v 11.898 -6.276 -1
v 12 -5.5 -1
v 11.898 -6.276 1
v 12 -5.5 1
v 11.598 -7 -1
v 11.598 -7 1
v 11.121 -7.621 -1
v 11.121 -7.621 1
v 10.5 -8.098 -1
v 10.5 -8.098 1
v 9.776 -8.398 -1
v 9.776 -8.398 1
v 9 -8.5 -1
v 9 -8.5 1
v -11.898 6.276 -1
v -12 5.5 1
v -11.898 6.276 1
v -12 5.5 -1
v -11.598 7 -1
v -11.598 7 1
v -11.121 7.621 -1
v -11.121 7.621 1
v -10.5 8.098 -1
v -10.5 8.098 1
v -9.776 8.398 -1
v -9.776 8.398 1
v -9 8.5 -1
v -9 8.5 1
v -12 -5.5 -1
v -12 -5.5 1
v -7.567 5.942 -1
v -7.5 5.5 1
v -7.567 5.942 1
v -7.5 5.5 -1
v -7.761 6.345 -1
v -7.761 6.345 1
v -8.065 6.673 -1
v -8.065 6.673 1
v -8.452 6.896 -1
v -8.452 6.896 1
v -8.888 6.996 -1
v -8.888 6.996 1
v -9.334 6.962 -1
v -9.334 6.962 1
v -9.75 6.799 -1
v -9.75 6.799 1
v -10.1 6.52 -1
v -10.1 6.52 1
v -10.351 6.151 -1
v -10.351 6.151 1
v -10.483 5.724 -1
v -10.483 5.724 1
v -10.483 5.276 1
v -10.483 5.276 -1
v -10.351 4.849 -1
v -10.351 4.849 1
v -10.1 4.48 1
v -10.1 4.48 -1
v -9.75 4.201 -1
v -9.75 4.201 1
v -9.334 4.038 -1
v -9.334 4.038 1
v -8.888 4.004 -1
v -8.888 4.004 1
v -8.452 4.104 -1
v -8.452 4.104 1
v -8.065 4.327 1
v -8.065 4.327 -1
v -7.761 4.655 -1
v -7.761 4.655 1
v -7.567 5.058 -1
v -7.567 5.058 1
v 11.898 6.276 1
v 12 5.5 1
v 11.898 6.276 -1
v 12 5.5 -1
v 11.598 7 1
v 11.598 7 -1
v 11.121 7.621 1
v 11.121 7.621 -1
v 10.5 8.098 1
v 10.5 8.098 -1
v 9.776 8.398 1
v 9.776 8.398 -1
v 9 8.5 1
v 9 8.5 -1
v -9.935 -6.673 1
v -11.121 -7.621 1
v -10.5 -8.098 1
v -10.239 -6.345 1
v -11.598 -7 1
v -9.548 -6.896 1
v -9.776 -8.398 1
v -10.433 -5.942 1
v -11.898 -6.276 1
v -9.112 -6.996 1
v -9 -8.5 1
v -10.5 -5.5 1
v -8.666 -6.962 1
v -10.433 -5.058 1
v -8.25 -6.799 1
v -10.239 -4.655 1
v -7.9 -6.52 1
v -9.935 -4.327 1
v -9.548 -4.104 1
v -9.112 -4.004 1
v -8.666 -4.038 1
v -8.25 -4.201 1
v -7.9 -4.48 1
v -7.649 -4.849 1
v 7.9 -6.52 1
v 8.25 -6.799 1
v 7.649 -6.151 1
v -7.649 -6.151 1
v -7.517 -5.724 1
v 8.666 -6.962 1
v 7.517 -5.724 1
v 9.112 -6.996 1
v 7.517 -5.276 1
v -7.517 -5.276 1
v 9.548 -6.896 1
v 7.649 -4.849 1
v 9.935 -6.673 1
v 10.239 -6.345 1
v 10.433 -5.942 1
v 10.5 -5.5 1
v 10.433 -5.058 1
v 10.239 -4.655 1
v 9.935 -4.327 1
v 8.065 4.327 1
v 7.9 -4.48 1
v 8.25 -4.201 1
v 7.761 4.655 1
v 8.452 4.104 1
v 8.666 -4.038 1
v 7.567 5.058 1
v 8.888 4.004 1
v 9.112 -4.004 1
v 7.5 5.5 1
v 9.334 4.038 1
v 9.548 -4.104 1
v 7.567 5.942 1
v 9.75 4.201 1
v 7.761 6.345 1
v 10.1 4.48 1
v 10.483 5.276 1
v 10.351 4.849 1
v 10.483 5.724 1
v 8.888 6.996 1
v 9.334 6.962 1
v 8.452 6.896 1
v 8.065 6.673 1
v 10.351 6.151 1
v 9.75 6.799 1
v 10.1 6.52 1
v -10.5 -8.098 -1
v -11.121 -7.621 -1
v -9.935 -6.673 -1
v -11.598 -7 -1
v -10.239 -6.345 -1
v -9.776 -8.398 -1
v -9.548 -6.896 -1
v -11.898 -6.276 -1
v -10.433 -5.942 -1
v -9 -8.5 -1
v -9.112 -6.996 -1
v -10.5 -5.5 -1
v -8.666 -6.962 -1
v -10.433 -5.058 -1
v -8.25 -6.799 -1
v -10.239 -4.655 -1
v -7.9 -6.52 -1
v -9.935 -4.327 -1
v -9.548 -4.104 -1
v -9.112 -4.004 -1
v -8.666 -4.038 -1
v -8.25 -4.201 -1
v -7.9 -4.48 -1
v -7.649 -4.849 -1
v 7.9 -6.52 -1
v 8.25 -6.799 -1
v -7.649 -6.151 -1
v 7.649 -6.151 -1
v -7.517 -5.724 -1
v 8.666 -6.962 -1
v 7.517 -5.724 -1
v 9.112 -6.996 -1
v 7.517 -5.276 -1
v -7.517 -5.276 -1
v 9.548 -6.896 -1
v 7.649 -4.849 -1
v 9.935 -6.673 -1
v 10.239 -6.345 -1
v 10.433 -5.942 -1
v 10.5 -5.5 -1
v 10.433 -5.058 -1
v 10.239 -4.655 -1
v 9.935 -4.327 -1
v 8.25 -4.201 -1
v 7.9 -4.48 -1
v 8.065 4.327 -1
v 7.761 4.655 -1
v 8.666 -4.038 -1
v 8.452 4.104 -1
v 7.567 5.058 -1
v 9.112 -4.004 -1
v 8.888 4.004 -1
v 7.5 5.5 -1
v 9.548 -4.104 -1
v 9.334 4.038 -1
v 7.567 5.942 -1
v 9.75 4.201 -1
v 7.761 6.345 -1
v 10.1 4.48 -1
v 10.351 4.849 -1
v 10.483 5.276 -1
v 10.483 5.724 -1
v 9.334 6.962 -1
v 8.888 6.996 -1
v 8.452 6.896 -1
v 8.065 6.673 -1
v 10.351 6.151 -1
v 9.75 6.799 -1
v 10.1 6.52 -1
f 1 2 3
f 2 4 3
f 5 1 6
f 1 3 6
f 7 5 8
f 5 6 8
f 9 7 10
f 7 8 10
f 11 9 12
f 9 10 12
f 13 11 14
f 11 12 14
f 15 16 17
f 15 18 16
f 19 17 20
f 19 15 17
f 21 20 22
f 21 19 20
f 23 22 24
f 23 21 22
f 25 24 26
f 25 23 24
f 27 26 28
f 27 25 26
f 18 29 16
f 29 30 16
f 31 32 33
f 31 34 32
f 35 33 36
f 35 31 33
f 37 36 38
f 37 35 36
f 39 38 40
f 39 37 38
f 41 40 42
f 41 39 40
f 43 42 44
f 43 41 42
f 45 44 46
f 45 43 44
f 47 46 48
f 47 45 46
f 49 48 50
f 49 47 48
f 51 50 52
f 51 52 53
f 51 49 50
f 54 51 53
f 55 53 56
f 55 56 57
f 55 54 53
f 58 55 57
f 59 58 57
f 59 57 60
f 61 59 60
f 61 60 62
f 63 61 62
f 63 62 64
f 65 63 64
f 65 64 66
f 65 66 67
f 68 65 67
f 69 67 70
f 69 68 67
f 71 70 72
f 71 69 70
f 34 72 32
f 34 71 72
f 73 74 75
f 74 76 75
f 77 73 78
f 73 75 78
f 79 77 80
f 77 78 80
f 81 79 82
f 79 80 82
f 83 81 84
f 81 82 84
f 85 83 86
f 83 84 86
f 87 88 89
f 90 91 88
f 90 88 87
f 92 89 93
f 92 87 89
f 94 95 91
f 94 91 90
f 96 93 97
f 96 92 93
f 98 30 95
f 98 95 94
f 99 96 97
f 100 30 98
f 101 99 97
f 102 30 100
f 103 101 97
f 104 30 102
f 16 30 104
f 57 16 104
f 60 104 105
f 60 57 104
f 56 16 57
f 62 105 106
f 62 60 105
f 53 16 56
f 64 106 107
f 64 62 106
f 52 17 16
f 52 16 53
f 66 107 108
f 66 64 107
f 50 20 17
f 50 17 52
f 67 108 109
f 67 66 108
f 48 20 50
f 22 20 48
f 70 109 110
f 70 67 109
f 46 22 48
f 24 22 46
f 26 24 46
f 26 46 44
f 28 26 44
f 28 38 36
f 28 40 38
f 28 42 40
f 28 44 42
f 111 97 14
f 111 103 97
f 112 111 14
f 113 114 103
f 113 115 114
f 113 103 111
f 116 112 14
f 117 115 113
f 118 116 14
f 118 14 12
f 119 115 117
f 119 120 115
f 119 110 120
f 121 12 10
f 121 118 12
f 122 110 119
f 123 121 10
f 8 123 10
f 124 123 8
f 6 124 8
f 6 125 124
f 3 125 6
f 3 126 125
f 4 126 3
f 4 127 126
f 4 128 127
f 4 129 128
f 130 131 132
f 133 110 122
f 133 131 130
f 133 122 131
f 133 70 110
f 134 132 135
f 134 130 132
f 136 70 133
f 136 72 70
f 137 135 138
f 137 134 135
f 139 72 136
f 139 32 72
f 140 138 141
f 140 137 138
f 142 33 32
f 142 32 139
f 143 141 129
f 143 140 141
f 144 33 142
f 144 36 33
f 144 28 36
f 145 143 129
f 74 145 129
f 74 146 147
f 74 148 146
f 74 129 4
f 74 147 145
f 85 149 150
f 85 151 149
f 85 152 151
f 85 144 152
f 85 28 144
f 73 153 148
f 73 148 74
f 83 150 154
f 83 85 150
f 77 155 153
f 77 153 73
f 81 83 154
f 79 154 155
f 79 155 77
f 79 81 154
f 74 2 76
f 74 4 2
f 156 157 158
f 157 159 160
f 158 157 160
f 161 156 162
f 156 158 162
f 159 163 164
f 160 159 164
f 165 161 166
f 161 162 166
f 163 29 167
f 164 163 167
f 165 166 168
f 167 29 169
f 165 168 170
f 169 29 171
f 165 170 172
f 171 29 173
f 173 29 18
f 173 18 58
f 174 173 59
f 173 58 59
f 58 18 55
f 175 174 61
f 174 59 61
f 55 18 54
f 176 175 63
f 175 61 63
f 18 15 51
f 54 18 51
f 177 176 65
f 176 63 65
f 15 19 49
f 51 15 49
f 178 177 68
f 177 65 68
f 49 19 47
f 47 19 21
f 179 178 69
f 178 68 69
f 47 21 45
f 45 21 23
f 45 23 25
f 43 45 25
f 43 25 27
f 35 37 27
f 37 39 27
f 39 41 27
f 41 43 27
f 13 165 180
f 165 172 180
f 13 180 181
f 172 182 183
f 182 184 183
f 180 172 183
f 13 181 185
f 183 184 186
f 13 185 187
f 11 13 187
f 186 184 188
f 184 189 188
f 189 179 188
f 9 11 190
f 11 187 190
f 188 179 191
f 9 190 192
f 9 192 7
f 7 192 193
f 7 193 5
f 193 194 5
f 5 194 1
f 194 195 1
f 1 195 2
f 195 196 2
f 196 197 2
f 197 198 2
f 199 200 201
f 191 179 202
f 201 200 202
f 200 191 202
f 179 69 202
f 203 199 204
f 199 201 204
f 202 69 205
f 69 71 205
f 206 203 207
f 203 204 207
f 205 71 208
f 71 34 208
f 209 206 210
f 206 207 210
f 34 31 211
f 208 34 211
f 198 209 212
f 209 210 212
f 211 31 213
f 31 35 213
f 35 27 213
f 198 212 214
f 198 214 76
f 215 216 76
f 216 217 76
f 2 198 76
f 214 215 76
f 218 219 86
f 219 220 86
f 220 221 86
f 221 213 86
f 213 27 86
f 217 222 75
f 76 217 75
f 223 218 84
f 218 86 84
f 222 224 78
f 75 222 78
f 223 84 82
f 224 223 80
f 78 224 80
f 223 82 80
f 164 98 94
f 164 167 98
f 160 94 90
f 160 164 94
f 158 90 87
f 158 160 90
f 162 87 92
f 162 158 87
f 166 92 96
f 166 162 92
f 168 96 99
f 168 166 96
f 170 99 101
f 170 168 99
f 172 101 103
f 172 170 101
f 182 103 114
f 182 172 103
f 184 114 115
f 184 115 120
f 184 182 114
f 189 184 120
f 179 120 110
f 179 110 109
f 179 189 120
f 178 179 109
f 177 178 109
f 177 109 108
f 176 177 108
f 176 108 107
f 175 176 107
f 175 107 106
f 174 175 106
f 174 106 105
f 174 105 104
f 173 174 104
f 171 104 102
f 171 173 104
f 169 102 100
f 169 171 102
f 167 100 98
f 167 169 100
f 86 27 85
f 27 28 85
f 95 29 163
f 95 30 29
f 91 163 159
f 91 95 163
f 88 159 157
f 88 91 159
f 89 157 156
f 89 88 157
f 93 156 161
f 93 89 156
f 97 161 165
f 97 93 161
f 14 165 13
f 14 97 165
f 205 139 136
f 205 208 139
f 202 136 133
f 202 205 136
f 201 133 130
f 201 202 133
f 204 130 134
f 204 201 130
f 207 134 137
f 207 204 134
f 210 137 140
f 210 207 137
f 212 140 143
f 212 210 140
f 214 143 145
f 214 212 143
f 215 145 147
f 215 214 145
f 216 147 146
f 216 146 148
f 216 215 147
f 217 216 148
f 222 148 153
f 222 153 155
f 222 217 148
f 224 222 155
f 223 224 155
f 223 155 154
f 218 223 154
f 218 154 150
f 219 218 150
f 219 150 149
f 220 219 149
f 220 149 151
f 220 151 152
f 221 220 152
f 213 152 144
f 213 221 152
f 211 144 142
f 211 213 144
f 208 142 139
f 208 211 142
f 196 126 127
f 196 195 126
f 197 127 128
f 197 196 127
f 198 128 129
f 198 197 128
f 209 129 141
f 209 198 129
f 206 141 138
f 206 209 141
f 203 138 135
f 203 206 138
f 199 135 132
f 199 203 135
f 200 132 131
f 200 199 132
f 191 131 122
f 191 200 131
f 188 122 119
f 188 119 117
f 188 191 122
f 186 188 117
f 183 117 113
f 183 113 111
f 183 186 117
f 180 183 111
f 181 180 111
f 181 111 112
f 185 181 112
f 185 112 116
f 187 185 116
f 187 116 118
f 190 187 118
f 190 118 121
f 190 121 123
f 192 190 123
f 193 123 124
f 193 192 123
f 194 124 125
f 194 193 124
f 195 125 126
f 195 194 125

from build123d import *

# Parameters (mm, degrees)
ESBO_O1_W                = 24
ESBO_O1_H                = 17
ESBO_O1_R                = 1.5
RESSALTO_EXTRUS_O1_DEPTH = 1
FILETE1_R                = 3


with BuildPart() as part:
    # Esboço1 → Ressalto-extrusão1 (new, symmetric)
    with BuildSketch(Plane.XY):
        Rectangle(ESBO_O1_W, ESBO_O1_H)
        with Locations((-9, 5.5)):
            Circle(ESBO_O1_R, mode=Mode.SUBTRACT)
        with Locations(Location((9, 5.5, 0), (0, 0, 180))):
            Circle(ESBO_O1_R, mode=Mode.SUBTRACT)
        with Locations((9, -5.5)):
            Circle(ESBO_O1_R, mode=Mode.SUBTRACT)
        with Locations(Location((-9, -5.5, 0), (0, 0, 180))):
            Circle(ESBO_O1_R, mode=Mode.SUBTRACT)
    extrude(amount=RESSALTO_EXTRUS_O1_DEPTH, both=True)

    # Filete1
    filete1_edges = [part.edges().sort_by_distance(p)[0] for p in [
        (12, -8.5, 0),
        (-12, -8.5, 0),
        (-12, 8.5, 0),
        (12, 8.5, 0),
    ]]
    fillet(filete1_edges, radius=FILETE1_R)


solid = part.part
